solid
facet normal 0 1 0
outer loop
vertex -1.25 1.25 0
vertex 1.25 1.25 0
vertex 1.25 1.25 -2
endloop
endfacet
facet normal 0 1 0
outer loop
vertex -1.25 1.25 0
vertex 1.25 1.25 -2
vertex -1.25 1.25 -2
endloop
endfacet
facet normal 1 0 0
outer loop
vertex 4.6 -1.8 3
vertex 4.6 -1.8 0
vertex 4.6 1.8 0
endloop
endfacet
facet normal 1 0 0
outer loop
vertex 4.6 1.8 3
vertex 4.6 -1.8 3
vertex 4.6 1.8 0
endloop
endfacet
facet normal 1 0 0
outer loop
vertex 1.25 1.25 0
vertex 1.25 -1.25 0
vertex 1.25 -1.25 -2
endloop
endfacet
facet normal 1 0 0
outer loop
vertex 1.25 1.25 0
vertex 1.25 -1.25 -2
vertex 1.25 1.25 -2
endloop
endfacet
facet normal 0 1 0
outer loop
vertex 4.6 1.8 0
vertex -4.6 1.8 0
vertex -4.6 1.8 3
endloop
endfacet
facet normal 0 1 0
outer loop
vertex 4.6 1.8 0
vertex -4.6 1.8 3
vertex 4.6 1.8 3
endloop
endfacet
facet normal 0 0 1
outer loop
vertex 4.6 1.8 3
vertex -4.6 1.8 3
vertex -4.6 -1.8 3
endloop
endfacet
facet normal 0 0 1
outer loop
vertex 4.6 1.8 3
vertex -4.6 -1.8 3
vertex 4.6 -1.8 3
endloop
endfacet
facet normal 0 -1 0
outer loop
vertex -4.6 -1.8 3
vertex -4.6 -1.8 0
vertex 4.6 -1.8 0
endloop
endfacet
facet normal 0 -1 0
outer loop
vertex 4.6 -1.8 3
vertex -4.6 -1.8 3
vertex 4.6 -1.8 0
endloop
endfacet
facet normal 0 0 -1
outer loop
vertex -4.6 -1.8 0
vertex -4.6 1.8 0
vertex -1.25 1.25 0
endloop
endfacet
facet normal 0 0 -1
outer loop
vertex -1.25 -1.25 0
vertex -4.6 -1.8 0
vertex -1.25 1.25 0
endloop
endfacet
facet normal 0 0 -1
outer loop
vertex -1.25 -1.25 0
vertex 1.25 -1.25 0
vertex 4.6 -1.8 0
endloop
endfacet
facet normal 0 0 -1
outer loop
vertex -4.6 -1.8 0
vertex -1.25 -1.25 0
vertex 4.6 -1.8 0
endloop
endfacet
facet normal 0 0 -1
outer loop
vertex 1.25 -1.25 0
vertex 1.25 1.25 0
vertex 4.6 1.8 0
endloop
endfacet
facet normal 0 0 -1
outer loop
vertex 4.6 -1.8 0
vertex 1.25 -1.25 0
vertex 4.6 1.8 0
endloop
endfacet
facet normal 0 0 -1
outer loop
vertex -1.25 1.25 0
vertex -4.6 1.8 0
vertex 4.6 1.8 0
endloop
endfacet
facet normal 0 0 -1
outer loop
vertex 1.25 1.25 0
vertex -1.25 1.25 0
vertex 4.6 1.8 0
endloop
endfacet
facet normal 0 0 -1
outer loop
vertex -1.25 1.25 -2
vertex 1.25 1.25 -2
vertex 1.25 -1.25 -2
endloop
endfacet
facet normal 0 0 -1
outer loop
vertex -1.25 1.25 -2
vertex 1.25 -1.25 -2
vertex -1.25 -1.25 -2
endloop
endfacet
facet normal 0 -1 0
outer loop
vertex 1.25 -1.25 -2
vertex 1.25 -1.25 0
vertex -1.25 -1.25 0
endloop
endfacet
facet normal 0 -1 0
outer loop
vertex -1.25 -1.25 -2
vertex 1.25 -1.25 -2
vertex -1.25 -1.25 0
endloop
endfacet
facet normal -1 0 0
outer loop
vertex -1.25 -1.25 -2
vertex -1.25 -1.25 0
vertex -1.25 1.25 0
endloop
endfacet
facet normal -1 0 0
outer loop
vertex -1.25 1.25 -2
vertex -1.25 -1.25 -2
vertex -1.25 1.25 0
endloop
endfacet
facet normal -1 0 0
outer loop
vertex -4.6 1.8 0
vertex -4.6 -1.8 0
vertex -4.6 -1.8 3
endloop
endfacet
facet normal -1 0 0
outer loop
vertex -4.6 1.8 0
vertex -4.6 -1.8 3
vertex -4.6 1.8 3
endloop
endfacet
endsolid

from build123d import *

# Parameters (mm, degrees)
SKETCH1_W           = 9.2
SKETCH1_H           = 3.6
BOSS_EXTRUDE1_DEPTH = 3
SKETCH2_W           = 2.5
SKETCH2_H           = 2.5
BOSS_EXTRUDE2_DEPTH = 2


with BuildPart() as part:
    # Sketch1 → Boss-Extrude1 (new body)
    with BuildSketch(Plane.XY):
        Rectangle(SKETCH1_W, SKETCH1_H)
    extrude(amount=BOSS_EXTRUDE1_DEPTH)

    # Sketch2 → Boss-Extrude2 (add)
    with BuildSketch(Plane(origin=(0, 0, 0), x_dir=(-1, 0, 0), z_dir=(0, 0, -1))):
        Rectangle(SKETCH2_W, SKETCH2_H)
    extrude(amount=BOSS_EXTRUDE2_DEPTH)


solid = part.part
